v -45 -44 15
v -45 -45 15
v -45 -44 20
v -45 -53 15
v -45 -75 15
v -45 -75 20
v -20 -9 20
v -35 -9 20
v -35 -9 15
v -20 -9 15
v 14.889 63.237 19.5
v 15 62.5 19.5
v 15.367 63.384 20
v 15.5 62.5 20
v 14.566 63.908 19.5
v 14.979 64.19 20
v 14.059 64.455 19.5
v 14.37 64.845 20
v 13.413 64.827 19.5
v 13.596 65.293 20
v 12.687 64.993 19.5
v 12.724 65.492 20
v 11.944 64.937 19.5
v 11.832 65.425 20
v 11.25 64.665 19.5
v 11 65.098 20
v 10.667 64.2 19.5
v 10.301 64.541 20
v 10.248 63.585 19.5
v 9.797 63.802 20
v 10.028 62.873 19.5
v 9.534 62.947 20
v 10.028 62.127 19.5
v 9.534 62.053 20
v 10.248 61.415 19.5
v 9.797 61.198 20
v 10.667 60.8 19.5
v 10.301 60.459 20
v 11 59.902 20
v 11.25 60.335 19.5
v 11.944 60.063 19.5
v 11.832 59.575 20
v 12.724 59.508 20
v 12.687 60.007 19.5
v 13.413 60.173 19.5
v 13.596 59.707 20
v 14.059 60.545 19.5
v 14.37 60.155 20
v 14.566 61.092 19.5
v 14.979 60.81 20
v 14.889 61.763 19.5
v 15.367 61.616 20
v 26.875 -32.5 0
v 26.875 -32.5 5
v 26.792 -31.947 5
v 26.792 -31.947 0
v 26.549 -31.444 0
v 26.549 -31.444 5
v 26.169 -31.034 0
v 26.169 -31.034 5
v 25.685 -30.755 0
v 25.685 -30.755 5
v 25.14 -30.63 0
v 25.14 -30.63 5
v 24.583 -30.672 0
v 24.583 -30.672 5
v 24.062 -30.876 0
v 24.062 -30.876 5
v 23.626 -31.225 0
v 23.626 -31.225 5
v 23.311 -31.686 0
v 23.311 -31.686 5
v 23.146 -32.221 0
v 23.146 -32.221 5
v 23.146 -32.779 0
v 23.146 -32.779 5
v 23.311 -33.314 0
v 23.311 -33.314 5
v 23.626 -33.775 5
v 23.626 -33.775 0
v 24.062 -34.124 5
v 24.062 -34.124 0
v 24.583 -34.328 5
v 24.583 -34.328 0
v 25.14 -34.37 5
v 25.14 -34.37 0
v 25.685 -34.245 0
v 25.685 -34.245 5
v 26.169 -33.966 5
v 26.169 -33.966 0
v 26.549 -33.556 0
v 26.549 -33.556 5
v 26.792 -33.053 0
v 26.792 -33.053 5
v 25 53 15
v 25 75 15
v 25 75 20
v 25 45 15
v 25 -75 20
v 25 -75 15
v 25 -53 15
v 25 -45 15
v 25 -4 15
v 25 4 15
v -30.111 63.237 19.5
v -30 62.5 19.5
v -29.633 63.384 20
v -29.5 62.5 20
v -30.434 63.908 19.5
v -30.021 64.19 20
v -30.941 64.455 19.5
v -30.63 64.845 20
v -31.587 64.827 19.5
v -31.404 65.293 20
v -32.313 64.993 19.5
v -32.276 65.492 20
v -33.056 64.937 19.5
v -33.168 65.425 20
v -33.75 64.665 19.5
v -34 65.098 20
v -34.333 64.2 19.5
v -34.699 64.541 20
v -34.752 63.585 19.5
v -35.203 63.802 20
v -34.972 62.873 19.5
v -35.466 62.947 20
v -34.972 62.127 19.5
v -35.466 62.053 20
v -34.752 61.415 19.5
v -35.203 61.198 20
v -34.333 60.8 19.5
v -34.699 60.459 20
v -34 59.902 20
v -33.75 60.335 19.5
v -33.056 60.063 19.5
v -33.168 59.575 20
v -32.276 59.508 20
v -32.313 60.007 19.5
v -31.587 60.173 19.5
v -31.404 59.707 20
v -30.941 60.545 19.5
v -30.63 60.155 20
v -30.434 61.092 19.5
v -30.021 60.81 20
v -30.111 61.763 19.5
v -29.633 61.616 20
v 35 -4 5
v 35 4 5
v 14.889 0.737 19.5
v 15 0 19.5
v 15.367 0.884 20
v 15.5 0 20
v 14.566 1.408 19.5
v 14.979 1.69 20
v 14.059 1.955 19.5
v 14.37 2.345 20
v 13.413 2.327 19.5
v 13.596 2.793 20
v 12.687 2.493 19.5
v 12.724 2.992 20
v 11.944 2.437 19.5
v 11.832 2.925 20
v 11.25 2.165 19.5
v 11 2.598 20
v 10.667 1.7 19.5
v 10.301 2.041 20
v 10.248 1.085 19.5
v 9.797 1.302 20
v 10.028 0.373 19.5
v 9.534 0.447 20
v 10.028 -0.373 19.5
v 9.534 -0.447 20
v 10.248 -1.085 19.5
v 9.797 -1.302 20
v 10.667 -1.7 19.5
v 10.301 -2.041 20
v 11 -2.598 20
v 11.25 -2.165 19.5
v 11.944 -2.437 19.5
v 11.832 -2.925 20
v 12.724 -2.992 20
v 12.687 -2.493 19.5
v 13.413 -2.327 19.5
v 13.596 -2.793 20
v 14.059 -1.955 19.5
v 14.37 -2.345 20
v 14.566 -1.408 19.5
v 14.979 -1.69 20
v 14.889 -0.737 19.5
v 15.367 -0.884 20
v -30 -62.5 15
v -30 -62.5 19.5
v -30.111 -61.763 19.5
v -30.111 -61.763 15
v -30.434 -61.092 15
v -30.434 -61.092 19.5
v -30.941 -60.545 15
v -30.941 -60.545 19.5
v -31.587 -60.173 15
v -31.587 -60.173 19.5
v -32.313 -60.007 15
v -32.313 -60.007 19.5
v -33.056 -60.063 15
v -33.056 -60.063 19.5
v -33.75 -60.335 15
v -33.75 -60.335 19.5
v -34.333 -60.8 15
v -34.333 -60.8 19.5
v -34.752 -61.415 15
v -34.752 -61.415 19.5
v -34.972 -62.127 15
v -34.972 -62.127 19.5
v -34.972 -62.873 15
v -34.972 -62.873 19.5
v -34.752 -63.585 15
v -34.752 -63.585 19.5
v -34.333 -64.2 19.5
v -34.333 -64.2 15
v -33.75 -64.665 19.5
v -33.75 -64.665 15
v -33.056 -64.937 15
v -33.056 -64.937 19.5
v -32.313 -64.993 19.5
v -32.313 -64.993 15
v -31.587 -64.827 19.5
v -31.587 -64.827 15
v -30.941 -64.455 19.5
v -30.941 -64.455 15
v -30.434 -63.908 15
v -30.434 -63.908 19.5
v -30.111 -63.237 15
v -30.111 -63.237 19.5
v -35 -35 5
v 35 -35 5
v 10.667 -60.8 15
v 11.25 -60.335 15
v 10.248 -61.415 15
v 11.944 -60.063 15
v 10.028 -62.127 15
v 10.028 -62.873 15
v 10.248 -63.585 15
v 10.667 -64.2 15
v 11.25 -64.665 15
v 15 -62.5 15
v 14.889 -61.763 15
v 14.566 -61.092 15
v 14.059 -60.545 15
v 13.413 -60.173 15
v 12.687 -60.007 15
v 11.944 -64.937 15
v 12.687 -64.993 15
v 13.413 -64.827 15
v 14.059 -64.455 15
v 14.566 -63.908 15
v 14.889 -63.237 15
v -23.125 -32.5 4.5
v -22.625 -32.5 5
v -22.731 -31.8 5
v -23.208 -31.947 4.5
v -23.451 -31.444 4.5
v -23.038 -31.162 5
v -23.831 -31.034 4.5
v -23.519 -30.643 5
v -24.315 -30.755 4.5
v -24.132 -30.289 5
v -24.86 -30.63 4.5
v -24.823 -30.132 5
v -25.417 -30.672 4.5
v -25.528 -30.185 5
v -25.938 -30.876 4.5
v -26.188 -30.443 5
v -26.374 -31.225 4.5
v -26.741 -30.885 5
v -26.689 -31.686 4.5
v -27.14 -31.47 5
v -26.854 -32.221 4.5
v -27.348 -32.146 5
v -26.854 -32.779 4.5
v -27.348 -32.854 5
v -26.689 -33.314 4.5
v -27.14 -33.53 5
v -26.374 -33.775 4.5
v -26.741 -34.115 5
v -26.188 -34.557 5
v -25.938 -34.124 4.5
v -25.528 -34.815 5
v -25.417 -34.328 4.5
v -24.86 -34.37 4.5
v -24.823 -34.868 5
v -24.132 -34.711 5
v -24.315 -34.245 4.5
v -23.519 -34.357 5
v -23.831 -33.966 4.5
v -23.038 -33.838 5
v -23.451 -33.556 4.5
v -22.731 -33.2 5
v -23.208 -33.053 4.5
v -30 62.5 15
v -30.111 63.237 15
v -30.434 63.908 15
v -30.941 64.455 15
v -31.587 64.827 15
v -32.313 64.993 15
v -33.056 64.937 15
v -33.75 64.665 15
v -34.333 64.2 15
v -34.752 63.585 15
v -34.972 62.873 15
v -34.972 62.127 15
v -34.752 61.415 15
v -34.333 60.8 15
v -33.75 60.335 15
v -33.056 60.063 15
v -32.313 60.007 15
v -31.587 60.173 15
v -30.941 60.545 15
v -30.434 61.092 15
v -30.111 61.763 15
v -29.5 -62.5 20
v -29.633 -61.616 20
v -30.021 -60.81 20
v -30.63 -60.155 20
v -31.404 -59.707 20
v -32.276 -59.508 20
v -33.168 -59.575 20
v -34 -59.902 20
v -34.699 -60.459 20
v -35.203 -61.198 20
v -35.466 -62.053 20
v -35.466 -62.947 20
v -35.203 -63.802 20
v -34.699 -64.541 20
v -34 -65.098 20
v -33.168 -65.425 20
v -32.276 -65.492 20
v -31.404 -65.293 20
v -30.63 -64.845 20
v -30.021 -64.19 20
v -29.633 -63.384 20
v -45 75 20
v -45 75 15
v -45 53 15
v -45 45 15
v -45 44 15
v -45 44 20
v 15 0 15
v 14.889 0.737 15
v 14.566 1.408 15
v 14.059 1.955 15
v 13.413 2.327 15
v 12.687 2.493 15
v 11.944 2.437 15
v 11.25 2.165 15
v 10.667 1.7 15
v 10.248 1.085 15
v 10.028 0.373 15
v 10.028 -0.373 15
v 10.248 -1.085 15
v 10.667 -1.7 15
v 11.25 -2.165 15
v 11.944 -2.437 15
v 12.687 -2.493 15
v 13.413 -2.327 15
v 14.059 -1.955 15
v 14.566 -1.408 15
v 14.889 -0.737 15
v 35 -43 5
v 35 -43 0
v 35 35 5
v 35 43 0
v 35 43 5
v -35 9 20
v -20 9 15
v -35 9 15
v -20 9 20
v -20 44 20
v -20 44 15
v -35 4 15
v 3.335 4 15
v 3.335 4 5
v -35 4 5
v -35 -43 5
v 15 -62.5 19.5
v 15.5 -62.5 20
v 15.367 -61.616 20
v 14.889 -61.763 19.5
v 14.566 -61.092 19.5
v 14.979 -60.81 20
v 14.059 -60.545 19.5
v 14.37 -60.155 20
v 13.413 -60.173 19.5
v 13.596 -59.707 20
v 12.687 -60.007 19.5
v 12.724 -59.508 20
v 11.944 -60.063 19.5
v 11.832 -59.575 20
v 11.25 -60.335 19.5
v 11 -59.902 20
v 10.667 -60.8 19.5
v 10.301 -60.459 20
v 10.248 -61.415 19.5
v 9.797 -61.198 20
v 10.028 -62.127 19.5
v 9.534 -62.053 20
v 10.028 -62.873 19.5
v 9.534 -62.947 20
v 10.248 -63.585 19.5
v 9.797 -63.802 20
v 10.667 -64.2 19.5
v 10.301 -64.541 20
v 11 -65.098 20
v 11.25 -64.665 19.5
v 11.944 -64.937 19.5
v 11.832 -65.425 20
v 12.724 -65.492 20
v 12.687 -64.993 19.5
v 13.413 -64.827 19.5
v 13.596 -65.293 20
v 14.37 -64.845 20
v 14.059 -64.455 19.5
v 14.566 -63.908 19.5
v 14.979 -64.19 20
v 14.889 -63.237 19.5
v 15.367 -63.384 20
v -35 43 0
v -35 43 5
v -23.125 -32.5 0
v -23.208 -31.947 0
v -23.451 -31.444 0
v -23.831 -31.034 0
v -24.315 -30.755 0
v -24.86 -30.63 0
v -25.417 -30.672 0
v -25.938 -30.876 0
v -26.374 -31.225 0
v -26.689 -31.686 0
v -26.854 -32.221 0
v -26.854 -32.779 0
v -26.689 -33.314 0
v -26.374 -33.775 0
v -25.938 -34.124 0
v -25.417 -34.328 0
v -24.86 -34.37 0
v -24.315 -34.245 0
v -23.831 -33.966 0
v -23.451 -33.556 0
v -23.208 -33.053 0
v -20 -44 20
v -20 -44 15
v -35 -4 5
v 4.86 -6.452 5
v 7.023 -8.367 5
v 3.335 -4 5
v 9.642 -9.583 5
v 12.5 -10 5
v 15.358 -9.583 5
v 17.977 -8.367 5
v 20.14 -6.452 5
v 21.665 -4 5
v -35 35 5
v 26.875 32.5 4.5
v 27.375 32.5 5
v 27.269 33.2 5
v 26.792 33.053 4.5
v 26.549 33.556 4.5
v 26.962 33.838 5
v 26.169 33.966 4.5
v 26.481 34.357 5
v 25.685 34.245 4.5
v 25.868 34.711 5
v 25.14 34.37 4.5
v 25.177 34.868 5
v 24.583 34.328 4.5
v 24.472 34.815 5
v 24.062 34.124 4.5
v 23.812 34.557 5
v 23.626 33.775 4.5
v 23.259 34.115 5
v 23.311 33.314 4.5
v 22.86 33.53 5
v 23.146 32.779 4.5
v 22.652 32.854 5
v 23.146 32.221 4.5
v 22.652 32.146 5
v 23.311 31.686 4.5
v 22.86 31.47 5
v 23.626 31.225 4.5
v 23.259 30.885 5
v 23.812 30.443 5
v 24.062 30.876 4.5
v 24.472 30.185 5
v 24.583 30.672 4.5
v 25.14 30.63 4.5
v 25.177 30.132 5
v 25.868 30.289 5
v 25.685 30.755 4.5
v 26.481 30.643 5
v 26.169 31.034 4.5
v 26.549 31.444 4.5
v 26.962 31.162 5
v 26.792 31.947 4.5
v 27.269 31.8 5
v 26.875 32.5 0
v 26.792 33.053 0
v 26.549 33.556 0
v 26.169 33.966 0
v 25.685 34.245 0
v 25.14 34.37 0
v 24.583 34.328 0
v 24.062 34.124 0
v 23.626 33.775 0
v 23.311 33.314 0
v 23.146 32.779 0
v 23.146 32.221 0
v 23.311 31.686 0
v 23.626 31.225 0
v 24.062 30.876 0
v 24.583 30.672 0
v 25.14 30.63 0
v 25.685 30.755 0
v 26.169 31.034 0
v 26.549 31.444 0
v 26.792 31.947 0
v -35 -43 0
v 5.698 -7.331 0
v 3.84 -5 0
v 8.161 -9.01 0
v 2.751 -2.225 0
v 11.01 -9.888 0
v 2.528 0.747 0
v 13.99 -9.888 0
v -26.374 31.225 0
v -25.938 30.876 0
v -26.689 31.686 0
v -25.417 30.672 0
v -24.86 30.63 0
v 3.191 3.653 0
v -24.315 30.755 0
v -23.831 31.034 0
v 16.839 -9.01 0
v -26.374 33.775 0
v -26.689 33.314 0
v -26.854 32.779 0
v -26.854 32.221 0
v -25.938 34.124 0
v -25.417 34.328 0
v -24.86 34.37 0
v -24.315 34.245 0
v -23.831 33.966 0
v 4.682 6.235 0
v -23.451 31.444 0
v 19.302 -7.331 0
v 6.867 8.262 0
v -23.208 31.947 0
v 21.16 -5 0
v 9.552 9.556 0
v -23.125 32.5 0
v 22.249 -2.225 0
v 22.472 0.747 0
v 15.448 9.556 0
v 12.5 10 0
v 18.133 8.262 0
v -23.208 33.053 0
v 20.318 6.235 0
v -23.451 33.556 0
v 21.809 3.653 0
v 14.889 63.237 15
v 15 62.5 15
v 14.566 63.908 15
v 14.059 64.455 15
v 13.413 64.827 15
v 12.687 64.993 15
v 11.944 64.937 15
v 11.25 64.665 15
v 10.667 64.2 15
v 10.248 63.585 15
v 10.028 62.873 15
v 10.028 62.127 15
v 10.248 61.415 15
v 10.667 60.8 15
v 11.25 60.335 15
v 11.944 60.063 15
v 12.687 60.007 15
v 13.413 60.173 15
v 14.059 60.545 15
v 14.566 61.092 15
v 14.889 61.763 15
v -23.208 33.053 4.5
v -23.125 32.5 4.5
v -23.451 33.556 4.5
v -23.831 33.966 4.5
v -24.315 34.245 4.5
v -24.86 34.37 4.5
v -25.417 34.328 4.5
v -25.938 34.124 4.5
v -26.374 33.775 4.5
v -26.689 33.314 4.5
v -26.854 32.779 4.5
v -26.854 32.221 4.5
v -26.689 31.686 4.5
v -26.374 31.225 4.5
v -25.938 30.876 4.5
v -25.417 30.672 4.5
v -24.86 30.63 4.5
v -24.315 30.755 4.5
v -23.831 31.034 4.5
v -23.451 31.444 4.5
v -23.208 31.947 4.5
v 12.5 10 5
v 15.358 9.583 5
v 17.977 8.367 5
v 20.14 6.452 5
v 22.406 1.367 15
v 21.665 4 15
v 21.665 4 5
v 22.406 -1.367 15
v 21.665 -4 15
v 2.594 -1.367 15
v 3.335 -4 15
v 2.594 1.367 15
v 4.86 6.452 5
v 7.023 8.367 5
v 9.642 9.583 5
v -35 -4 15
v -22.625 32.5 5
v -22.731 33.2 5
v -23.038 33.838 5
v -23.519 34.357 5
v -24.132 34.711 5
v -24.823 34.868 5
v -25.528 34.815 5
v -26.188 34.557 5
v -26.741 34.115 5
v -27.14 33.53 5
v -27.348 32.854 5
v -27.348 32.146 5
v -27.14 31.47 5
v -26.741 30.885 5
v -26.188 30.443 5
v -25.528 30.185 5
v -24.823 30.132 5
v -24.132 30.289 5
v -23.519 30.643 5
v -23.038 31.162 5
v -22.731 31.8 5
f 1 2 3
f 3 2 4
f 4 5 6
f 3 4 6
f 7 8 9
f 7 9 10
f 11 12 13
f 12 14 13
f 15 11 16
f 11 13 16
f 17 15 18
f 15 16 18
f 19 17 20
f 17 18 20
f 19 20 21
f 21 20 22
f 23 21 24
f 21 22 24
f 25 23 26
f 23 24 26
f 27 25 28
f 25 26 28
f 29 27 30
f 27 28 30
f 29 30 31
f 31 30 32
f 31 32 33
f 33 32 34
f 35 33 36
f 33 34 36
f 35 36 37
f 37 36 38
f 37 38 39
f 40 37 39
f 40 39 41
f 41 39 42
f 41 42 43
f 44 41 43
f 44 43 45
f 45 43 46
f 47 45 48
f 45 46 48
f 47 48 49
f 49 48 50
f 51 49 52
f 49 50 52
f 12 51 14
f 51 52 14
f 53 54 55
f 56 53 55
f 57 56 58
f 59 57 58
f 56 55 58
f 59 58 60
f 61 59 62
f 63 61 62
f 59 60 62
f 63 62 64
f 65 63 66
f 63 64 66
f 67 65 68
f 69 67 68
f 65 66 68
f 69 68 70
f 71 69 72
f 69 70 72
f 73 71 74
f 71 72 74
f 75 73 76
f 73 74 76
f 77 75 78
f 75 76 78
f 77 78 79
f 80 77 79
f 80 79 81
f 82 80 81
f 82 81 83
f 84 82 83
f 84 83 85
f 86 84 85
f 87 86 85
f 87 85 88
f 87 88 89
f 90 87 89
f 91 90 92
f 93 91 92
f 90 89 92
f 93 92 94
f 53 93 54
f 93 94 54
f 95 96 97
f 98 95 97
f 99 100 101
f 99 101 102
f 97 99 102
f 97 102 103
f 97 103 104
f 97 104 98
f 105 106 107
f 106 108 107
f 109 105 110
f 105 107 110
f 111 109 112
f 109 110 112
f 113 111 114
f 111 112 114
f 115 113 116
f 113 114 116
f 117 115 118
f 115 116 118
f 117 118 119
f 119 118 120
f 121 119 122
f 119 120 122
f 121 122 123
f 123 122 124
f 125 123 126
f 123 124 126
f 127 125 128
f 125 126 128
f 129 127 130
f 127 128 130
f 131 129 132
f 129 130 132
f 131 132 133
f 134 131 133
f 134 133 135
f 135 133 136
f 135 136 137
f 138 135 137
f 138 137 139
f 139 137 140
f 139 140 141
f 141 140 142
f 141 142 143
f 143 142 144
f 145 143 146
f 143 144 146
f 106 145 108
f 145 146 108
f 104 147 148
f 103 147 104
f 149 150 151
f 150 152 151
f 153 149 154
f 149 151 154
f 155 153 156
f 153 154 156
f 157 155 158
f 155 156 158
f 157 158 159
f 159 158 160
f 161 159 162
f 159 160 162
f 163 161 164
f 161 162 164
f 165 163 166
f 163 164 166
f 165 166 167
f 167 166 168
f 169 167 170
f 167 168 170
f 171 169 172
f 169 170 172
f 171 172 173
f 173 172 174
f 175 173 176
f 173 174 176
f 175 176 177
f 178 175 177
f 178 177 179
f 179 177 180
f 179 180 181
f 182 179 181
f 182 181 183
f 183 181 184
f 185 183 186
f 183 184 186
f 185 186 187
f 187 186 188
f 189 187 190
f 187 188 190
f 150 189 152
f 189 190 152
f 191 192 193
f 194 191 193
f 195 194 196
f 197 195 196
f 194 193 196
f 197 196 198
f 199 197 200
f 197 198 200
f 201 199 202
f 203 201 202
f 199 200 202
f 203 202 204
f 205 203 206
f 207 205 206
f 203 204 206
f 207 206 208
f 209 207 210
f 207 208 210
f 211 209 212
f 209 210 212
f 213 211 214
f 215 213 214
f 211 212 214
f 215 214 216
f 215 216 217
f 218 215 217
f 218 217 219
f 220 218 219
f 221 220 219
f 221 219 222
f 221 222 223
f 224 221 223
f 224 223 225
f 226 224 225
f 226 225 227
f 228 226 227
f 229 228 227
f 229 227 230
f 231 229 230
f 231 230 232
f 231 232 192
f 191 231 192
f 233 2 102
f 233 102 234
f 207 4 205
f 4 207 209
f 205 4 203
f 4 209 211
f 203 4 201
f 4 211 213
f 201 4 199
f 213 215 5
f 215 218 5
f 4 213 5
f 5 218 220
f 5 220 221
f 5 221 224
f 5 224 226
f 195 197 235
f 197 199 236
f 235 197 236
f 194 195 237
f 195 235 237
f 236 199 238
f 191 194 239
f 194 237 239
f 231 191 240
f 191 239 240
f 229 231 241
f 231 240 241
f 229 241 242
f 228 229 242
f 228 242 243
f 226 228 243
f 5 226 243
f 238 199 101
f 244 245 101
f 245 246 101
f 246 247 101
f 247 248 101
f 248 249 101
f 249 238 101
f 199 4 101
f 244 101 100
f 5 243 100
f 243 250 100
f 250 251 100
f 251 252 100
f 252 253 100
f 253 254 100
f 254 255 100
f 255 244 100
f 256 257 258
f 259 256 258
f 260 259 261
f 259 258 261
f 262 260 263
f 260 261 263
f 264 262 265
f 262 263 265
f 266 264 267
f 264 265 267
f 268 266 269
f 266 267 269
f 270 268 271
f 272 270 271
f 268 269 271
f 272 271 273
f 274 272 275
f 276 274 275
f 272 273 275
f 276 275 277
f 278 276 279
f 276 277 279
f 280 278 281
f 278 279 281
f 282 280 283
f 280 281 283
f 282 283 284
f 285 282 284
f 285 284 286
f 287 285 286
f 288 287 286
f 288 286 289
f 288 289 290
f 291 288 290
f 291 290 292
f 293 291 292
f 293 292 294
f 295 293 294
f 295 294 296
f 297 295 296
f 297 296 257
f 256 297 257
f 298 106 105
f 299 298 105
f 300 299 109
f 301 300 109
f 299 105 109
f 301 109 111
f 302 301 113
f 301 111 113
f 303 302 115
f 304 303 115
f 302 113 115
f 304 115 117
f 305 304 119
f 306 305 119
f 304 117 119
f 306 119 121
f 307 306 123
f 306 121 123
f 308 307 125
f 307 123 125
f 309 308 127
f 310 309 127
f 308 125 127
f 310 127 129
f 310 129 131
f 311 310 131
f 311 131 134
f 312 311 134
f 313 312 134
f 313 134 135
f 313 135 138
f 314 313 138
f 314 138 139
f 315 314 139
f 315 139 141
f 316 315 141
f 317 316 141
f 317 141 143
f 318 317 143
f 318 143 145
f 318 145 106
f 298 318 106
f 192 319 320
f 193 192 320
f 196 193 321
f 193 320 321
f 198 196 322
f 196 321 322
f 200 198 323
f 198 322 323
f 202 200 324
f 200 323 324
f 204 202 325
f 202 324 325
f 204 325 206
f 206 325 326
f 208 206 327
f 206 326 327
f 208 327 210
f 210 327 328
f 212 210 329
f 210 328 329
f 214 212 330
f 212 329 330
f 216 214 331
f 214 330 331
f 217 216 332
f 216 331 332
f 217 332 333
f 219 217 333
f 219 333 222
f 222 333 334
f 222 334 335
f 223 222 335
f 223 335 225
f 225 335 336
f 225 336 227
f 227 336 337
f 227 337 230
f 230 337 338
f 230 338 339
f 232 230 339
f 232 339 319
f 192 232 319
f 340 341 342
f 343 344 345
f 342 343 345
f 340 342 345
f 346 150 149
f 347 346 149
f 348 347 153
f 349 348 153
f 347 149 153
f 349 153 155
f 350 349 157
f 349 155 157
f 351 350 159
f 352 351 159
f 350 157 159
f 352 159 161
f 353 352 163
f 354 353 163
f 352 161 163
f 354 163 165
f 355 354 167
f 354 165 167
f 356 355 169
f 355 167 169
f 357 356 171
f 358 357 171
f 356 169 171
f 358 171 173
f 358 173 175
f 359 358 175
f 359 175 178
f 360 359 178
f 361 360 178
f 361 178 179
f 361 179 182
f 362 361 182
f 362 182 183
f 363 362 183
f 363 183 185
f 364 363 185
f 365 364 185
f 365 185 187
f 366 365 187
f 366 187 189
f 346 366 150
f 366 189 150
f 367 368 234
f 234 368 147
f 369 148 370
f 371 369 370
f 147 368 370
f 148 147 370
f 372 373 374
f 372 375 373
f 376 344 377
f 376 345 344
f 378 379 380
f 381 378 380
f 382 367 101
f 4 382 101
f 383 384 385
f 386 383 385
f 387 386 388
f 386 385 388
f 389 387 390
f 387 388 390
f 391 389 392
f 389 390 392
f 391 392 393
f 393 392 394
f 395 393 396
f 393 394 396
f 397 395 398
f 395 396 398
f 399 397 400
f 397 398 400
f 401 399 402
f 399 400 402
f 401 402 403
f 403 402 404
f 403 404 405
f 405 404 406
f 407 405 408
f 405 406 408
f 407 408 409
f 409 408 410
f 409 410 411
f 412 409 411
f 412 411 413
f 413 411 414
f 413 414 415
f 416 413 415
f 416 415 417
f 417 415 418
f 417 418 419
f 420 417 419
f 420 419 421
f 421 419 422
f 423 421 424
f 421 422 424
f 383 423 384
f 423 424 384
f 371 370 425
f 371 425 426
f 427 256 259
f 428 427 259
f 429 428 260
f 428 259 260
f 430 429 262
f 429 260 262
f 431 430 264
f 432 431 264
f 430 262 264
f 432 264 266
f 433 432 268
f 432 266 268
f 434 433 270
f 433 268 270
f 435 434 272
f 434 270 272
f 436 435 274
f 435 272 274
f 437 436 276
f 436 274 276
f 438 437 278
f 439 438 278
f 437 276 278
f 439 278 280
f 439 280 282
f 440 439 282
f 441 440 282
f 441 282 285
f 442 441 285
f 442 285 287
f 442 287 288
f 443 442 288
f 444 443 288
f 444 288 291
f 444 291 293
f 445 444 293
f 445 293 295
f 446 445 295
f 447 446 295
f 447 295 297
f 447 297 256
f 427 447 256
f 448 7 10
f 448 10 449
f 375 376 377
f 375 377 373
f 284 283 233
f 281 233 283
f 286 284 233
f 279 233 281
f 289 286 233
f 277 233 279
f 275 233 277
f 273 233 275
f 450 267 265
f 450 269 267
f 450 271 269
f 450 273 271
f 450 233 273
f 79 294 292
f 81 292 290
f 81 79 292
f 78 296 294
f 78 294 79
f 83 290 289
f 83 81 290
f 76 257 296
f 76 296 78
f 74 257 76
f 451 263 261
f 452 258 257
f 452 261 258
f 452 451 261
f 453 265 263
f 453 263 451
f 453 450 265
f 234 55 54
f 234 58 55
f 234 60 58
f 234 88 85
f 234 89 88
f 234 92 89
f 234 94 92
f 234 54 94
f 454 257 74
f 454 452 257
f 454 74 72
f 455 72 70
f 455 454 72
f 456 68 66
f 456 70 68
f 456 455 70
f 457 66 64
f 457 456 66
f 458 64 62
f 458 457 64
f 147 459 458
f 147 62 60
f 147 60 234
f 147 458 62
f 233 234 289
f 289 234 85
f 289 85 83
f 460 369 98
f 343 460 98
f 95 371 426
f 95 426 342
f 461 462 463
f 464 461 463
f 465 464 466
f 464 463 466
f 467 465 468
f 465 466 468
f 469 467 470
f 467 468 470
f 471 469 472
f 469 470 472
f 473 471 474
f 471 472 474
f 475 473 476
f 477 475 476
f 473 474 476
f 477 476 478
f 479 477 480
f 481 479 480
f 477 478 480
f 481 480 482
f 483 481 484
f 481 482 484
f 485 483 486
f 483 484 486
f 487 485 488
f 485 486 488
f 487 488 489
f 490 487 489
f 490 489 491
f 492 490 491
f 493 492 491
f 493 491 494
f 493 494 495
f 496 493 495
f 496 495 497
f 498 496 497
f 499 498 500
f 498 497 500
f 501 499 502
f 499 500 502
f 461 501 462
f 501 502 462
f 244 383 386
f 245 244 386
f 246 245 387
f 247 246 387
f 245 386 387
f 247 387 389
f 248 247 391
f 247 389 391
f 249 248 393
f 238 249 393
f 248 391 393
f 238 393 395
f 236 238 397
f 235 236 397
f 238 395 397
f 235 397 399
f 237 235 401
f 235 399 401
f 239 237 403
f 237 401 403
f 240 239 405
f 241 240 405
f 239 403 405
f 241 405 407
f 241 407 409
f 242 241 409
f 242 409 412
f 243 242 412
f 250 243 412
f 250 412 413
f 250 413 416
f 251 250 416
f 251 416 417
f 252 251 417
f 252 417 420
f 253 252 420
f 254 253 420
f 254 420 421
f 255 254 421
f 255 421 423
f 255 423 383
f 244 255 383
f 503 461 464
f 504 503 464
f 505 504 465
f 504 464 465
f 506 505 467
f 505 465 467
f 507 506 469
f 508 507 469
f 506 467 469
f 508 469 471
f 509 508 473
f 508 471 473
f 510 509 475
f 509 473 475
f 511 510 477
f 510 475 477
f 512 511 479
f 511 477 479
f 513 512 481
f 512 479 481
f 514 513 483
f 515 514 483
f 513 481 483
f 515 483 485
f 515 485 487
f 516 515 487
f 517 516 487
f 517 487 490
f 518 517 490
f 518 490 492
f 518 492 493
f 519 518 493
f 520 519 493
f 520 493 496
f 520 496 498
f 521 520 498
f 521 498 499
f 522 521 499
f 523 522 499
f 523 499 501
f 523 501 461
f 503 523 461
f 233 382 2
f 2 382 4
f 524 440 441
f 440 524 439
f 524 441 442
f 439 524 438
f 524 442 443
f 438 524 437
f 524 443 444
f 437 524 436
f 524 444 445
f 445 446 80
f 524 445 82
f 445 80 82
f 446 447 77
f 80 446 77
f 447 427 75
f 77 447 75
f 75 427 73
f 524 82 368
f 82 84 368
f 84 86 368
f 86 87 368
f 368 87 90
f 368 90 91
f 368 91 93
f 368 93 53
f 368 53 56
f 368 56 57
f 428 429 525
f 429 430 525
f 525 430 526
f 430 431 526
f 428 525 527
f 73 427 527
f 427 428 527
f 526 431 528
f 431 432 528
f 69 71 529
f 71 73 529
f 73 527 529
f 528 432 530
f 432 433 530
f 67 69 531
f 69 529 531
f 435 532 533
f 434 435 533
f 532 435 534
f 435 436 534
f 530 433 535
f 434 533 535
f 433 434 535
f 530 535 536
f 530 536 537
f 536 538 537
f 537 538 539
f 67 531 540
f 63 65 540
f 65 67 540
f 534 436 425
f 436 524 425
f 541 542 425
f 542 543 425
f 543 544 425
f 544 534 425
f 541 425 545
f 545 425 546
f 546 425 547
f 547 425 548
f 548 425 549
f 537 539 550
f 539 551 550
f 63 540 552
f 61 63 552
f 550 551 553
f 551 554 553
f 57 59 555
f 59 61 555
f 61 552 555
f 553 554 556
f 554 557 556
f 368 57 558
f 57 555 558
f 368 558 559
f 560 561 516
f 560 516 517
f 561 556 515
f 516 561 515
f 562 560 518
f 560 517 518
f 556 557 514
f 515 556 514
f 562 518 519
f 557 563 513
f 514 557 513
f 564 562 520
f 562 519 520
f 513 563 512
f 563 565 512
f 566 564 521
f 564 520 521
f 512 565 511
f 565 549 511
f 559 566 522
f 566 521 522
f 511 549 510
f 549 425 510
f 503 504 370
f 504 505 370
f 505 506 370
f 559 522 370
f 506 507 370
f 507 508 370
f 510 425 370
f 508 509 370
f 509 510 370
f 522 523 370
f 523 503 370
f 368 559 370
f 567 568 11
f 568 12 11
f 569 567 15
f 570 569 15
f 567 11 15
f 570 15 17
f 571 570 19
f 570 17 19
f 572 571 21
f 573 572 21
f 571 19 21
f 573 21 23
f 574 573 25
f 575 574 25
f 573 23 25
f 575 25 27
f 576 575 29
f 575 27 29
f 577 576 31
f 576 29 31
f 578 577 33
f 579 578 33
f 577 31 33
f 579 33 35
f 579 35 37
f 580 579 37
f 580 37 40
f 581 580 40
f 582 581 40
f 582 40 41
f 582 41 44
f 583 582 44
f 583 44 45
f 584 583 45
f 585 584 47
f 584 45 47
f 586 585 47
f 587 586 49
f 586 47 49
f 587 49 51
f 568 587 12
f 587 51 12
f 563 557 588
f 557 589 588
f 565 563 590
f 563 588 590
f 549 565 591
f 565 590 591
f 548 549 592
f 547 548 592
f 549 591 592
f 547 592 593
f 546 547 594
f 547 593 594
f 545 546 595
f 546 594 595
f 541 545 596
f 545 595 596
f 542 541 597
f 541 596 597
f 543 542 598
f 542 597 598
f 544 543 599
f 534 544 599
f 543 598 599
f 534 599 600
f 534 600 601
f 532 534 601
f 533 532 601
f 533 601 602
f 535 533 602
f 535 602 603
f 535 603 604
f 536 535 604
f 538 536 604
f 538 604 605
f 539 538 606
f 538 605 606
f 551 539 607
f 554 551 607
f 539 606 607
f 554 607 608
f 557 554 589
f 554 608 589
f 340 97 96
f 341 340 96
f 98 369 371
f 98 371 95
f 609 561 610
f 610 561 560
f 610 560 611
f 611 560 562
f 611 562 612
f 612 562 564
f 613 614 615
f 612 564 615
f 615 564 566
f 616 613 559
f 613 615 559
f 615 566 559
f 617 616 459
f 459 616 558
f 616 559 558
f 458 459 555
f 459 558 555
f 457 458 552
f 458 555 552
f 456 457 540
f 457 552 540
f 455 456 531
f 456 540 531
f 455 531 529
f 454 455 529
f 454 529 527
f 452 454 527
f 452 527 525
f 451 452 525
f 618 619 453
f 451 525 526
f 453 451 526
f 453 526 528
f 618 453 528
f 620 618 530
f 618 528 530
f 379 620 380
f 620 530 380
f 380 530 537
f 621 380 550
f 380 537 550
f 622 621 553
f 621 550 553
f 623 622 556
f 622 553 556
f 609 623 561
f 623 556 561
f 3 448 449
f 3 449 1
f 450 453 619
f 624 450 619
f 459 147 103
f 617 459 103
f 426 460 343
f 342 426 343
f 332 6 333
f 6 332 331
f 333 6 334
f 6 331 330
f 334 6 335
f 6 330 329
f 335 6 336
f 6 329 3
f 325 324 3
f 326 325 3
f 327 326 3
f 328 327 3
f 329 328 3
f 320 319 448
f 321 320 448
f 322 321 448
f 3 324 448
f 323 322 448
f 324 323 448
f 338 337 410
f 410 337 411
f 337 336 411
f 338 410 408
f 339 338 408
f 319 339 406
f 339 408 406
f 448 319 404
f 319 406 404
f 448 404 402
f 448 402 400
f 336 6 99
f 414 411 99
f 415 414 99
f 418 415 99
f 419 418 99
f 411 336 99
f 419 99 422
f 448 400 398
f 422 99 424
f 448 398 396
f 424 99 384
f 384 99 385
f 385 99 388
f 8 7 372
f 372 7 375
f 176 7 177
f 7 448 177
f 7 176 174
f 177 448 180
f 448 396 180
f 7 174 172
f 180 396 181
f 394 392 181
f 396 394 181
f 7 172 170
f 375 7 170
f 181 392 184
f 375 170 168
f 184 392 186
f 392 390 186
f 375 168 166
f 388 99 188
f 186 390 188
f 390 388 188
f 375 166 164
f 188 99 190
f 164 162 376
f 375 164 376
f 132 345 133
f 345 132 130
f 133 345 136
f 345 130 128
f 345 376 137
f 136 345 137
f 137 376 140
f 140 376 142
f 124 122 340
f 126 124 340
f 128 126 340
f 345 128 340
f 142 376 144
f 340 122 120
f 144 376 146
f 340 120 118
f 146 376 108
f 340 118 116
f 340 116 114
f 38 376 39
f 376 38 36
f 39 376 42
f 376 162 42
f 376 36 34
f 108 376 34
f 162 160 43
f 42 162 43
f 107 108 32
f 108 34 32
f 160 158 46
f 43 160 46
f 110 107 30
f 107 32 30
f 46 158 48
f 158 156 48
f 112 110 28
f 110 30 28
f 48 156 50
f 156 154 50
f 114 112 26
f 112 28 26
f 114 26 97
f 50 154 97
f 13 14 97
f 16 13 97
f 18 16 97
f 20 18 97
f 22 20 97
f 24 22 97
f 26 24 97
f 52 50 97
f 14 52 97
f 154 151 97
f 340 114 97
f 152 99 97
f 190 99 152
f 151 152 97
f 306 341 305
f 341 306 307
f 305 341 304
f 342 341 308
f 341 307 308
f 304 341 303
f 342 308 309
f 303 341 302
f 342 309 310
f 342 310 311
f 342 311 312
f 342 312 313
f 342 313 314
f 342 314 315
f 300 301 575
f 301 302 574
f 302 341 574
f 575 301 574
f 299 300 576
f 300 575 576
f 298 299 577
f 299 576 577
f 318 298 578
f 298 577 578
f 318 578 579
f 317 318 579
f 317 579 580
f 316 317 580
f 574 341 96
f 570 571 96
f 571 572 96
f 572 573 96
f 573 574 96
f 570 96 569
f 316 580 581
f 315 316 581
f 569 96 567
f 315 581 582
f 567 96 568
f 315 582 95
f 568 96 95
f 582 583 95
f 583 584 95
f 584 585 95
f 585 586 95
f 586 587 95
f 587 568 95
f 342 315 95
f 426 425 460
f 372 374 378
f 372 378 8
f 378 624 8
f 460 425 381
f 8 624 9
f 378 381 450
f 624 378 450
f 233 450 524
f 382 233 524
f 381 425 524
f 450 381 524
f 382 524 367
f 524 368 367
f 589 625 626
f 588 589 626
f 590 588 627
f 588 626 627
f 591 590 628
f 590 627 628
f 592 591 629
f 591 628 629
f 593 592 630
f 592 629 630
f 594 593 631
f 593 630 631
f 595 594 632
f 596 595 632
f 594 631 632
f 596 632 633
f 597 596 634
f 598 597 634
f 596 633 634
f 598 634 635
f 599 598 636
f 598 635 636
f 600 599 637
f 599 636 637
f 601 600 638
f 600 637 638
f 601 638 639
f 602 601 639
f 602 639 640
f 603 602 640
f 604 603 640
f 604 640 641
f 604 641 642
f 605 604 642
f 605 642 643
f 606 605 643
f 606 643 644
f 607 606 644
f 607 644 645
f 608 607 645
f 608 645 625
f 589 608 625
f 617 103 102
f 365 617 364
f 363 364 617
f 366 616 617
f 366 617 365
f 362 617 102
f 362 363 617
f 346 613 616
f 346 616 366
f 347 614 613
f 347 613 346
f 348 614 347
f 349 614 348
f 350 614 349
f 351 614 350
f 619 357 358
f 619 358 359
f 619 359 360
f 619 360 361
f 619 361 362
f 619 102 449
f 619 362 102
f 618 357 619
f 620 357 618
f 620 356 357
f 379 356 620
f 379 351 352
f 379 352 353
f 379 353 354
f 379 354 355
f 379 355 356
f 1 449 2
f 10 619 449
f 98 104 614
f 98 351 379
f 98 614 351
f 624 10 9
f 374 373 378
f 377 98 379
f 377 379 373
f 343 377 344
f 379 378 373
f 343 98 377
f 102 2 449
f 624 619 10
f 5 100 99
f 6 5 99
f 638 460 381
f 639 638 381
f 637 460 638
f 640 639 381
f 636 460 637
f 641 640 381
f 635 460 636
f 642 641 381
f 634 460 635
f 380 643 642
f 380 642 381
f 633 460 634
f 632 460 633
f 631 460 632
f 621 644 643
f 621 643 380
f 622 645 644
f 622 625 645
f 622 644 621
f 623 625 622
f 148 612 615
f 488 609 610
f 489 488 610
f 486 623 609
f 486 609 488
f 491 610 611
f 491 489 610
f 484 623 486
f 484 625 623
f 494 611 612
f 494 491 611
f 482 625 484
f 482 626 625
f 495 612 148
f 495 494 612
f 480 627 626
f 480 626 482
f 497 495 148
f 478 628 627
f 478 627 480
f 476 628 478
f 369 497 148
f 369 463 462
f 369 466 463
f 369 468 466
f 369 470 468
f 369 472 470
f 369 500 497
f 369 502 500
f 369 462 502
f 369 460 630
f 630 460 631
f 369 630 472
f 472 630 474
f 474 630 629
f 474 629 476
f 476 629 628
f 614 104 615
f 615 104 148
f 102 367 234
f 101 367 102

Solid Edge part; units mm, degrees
sketch "Sketch1" plane through (0, 0, 0) normal (0, 0, 1) x (1, 0, 0)
  line L0 (-35, -35) -> (35, -35)
  line L1 (35, -35) -> (35, 35)
  line L2 (35, 35) -> (-35, 35)
  line L3 (-35, 35) -> (-35, -35)
  dimension "D1" = 70
  dimension "D2" = 70
extrude "Protrusion1" add sketch "Sketch1" along normal blind 5
sketch "Sketch2" plane through (0, 0, 5) normal (0, 0, 1) x (1, 0, 0)
  circle A0 centre (25, -32.5) radius 1.875
  circle A1 centre (-25, -32.5) radius 1.875
  circle A2 centre (-25, 32.5) radius 1.875
  circle A3 centre (25, 32.5) radius 1.875
  dimension "D1" = 50
  dimension "D2" = 3.75
  dimension "D3" = 65
extrude "Cutout1" cut sketch "Sketch2" against normal through all
chamfer "Fase_1" distance 0.5 angle 45 3 edges at (-26.875, -32.5, 5) (-26.875, 32.5, 5) (23.125, 32.5, 5)
sketch "Sketch3" plane through (35, 0, 2.5) normal (1, 0, 0) x (0, 1, 0)
  line L0 (-53, 12.5) -> (-75, 12.5)
  line L1 (-75, 12.5) -> (-75, 17.5)
  line L2 (-75, 17.5) -> (75, 17.5)
  line L3 (75, 17.5) -> (75, 12.5)
  line L4 (75, 12.5) -> (53, 12.5)
  line L5 (43, 2.5) -> (53, 12.5)
  line L6 (43, -2.5) -> (43, 2.5)
  line L7 (35, -2.5) -> (43, -2.5)
  line L8 (35, -2.5) -> (35, 2.5)
  line L9 (35, 2.5) -> (45, 12.5)
  line L10 (45, 12.5) -> (4, 12.5)
  line L11 (4, 12.5) -> (4, 2.5)
  line L12 (4, -2.5) -> (4, 2.5)
  line L13 (-4, -2.5) -> (4, -2.5)
  line L14 (-4, 2.5) -> (-4, -2.5)
  line L15 (-4, 2.5) -> (-4, 12.5)
  line L16 (-4, 12.5) -> (-45, 12.5)
  line L17 (-45, 12.5) -> (-35, 2.5)
  line L18 (-35, 2.5) -> (-35, -2.5)
  line L19 (-35, -2.5) -> (-43, -2.5)
  line L20 (-43, -2.5) -> (-43, 2.5)
  line L21 (-43, 2.5) -> (-53, 12.5)
  dimension "D1" = 150
  dimension "D2" = 20
  dimension "D3" = 5
  dimension "D4" = 8
  dimension "D5" = 8
extrude "Extrusionsausprägung_2" add sketch "Sketch3" against normal blind 100
sketch "Sketch4" plane through (-15, -75, 32.5) normal (0, -1, 0) x (-1, 0, 0)
  line L0 (-50, 32.5) -> (-50, 27.5)
  line L1 (-50, 27.5) -> (-40, 17.5)
  line L2 (-40, 17.5) -> (-40, 12.5)
  dimension "D1" = 5
extrude "Cutout2" cut sketch "Sketch4" against normal through all material side at (35.05, -75, 2.5)
sketch "Sketch5" plane through (-27.5, -75, 32.5) normal (0, -1, 0) x (1, 0, 0)
  line L0 (-7.5, -32.5) -> (-7.5, -27.5)
  line L1 (-7.5, -27.5) -> (-17.5, -17.5)
  line L2 (-17.5, -17.5) -> (-17.5, -12.5)
extrude "Cutout3" cut sketch "Sketch5" against normal through all material side at (-35.05, -75, 2.5)
sketch "Sketch6" plane through (-10, 0, 20) normal (0, 0, 1) x (1, 0, 0)
  circle A0 centre (22.5, 62.5) radius 2.5
  circle A1 centre (-22.5, 62.5) radius 2.5
  circle A2 centre (-22.5, -62.5) radius 2.5
  circle A3 centre (22.5, -62.5) radius 2.5
  circle A4 centre (22.5, 0) radius 2.5
  dimension "D1" = 45
  dimension "D2" = 125
  dimension "D3" = 5
extrude "Cutout4" cut sketch "Sketch6" against normal through all
chamfer "Fase_2" distance 0.5 angle 45 5 edges at (-35, -62.5, 20) (10, -62.5, 20) (10, 0, 20) (-35, 62.5, 20) (10, 62.5, 20)
sketch "Sketch7" plane through (-10, 0, 20) normal (0, 0, 1) x (0, 1, 0)
  line L0 (-44, 35) -> (-9, 35)
  line L1 (-9, 35) -> (-9, 10)
  line L2 (-9, 10) -> (-44, 10)
  line L3 (-44, 10) -> (-44, 35)
  line L4 (9, 35) -> (44, 35)
  line L5 (44, 35) -> (44, 10)
  line L6 (44, 10) -> (9, 10)
  line L7 (9, 10) -> (9, 35)
  dimension "D1" = 35
  dimension "D2" = 5
  dimension "D3" = 25
  dimension "D4" = 5
extrude "Cutout5" cut sketch "Sketch7" against normal up to vertex (5 mm away)
sketch "Sketch8" plane through (-10, 0, 20) normal (0, 0, 1) x (0, 1, 0)
  line L0 (-9, 25) -> (9, 25)
  line L1 (9, 25) -> (9, 35)
  line L2 (9, 35) -> (-9, 35)
  line L3 (-9, 35) -> (-9, 25)
extrude "Cutout6" cut sketch "Sketch8" against normal through all
sketch "Sketch9" plane through (0, 0, 0) normal (0, 0, -1) x (0, 1, 0)
  circle A0 centre (0, 12.5) radius 10
  dimension "D1" = 20
extrude "Cutout7" cut sketch "Sketch9" against normal up to vertex (15 mm away)
properties material "Nylon, allgemein"
